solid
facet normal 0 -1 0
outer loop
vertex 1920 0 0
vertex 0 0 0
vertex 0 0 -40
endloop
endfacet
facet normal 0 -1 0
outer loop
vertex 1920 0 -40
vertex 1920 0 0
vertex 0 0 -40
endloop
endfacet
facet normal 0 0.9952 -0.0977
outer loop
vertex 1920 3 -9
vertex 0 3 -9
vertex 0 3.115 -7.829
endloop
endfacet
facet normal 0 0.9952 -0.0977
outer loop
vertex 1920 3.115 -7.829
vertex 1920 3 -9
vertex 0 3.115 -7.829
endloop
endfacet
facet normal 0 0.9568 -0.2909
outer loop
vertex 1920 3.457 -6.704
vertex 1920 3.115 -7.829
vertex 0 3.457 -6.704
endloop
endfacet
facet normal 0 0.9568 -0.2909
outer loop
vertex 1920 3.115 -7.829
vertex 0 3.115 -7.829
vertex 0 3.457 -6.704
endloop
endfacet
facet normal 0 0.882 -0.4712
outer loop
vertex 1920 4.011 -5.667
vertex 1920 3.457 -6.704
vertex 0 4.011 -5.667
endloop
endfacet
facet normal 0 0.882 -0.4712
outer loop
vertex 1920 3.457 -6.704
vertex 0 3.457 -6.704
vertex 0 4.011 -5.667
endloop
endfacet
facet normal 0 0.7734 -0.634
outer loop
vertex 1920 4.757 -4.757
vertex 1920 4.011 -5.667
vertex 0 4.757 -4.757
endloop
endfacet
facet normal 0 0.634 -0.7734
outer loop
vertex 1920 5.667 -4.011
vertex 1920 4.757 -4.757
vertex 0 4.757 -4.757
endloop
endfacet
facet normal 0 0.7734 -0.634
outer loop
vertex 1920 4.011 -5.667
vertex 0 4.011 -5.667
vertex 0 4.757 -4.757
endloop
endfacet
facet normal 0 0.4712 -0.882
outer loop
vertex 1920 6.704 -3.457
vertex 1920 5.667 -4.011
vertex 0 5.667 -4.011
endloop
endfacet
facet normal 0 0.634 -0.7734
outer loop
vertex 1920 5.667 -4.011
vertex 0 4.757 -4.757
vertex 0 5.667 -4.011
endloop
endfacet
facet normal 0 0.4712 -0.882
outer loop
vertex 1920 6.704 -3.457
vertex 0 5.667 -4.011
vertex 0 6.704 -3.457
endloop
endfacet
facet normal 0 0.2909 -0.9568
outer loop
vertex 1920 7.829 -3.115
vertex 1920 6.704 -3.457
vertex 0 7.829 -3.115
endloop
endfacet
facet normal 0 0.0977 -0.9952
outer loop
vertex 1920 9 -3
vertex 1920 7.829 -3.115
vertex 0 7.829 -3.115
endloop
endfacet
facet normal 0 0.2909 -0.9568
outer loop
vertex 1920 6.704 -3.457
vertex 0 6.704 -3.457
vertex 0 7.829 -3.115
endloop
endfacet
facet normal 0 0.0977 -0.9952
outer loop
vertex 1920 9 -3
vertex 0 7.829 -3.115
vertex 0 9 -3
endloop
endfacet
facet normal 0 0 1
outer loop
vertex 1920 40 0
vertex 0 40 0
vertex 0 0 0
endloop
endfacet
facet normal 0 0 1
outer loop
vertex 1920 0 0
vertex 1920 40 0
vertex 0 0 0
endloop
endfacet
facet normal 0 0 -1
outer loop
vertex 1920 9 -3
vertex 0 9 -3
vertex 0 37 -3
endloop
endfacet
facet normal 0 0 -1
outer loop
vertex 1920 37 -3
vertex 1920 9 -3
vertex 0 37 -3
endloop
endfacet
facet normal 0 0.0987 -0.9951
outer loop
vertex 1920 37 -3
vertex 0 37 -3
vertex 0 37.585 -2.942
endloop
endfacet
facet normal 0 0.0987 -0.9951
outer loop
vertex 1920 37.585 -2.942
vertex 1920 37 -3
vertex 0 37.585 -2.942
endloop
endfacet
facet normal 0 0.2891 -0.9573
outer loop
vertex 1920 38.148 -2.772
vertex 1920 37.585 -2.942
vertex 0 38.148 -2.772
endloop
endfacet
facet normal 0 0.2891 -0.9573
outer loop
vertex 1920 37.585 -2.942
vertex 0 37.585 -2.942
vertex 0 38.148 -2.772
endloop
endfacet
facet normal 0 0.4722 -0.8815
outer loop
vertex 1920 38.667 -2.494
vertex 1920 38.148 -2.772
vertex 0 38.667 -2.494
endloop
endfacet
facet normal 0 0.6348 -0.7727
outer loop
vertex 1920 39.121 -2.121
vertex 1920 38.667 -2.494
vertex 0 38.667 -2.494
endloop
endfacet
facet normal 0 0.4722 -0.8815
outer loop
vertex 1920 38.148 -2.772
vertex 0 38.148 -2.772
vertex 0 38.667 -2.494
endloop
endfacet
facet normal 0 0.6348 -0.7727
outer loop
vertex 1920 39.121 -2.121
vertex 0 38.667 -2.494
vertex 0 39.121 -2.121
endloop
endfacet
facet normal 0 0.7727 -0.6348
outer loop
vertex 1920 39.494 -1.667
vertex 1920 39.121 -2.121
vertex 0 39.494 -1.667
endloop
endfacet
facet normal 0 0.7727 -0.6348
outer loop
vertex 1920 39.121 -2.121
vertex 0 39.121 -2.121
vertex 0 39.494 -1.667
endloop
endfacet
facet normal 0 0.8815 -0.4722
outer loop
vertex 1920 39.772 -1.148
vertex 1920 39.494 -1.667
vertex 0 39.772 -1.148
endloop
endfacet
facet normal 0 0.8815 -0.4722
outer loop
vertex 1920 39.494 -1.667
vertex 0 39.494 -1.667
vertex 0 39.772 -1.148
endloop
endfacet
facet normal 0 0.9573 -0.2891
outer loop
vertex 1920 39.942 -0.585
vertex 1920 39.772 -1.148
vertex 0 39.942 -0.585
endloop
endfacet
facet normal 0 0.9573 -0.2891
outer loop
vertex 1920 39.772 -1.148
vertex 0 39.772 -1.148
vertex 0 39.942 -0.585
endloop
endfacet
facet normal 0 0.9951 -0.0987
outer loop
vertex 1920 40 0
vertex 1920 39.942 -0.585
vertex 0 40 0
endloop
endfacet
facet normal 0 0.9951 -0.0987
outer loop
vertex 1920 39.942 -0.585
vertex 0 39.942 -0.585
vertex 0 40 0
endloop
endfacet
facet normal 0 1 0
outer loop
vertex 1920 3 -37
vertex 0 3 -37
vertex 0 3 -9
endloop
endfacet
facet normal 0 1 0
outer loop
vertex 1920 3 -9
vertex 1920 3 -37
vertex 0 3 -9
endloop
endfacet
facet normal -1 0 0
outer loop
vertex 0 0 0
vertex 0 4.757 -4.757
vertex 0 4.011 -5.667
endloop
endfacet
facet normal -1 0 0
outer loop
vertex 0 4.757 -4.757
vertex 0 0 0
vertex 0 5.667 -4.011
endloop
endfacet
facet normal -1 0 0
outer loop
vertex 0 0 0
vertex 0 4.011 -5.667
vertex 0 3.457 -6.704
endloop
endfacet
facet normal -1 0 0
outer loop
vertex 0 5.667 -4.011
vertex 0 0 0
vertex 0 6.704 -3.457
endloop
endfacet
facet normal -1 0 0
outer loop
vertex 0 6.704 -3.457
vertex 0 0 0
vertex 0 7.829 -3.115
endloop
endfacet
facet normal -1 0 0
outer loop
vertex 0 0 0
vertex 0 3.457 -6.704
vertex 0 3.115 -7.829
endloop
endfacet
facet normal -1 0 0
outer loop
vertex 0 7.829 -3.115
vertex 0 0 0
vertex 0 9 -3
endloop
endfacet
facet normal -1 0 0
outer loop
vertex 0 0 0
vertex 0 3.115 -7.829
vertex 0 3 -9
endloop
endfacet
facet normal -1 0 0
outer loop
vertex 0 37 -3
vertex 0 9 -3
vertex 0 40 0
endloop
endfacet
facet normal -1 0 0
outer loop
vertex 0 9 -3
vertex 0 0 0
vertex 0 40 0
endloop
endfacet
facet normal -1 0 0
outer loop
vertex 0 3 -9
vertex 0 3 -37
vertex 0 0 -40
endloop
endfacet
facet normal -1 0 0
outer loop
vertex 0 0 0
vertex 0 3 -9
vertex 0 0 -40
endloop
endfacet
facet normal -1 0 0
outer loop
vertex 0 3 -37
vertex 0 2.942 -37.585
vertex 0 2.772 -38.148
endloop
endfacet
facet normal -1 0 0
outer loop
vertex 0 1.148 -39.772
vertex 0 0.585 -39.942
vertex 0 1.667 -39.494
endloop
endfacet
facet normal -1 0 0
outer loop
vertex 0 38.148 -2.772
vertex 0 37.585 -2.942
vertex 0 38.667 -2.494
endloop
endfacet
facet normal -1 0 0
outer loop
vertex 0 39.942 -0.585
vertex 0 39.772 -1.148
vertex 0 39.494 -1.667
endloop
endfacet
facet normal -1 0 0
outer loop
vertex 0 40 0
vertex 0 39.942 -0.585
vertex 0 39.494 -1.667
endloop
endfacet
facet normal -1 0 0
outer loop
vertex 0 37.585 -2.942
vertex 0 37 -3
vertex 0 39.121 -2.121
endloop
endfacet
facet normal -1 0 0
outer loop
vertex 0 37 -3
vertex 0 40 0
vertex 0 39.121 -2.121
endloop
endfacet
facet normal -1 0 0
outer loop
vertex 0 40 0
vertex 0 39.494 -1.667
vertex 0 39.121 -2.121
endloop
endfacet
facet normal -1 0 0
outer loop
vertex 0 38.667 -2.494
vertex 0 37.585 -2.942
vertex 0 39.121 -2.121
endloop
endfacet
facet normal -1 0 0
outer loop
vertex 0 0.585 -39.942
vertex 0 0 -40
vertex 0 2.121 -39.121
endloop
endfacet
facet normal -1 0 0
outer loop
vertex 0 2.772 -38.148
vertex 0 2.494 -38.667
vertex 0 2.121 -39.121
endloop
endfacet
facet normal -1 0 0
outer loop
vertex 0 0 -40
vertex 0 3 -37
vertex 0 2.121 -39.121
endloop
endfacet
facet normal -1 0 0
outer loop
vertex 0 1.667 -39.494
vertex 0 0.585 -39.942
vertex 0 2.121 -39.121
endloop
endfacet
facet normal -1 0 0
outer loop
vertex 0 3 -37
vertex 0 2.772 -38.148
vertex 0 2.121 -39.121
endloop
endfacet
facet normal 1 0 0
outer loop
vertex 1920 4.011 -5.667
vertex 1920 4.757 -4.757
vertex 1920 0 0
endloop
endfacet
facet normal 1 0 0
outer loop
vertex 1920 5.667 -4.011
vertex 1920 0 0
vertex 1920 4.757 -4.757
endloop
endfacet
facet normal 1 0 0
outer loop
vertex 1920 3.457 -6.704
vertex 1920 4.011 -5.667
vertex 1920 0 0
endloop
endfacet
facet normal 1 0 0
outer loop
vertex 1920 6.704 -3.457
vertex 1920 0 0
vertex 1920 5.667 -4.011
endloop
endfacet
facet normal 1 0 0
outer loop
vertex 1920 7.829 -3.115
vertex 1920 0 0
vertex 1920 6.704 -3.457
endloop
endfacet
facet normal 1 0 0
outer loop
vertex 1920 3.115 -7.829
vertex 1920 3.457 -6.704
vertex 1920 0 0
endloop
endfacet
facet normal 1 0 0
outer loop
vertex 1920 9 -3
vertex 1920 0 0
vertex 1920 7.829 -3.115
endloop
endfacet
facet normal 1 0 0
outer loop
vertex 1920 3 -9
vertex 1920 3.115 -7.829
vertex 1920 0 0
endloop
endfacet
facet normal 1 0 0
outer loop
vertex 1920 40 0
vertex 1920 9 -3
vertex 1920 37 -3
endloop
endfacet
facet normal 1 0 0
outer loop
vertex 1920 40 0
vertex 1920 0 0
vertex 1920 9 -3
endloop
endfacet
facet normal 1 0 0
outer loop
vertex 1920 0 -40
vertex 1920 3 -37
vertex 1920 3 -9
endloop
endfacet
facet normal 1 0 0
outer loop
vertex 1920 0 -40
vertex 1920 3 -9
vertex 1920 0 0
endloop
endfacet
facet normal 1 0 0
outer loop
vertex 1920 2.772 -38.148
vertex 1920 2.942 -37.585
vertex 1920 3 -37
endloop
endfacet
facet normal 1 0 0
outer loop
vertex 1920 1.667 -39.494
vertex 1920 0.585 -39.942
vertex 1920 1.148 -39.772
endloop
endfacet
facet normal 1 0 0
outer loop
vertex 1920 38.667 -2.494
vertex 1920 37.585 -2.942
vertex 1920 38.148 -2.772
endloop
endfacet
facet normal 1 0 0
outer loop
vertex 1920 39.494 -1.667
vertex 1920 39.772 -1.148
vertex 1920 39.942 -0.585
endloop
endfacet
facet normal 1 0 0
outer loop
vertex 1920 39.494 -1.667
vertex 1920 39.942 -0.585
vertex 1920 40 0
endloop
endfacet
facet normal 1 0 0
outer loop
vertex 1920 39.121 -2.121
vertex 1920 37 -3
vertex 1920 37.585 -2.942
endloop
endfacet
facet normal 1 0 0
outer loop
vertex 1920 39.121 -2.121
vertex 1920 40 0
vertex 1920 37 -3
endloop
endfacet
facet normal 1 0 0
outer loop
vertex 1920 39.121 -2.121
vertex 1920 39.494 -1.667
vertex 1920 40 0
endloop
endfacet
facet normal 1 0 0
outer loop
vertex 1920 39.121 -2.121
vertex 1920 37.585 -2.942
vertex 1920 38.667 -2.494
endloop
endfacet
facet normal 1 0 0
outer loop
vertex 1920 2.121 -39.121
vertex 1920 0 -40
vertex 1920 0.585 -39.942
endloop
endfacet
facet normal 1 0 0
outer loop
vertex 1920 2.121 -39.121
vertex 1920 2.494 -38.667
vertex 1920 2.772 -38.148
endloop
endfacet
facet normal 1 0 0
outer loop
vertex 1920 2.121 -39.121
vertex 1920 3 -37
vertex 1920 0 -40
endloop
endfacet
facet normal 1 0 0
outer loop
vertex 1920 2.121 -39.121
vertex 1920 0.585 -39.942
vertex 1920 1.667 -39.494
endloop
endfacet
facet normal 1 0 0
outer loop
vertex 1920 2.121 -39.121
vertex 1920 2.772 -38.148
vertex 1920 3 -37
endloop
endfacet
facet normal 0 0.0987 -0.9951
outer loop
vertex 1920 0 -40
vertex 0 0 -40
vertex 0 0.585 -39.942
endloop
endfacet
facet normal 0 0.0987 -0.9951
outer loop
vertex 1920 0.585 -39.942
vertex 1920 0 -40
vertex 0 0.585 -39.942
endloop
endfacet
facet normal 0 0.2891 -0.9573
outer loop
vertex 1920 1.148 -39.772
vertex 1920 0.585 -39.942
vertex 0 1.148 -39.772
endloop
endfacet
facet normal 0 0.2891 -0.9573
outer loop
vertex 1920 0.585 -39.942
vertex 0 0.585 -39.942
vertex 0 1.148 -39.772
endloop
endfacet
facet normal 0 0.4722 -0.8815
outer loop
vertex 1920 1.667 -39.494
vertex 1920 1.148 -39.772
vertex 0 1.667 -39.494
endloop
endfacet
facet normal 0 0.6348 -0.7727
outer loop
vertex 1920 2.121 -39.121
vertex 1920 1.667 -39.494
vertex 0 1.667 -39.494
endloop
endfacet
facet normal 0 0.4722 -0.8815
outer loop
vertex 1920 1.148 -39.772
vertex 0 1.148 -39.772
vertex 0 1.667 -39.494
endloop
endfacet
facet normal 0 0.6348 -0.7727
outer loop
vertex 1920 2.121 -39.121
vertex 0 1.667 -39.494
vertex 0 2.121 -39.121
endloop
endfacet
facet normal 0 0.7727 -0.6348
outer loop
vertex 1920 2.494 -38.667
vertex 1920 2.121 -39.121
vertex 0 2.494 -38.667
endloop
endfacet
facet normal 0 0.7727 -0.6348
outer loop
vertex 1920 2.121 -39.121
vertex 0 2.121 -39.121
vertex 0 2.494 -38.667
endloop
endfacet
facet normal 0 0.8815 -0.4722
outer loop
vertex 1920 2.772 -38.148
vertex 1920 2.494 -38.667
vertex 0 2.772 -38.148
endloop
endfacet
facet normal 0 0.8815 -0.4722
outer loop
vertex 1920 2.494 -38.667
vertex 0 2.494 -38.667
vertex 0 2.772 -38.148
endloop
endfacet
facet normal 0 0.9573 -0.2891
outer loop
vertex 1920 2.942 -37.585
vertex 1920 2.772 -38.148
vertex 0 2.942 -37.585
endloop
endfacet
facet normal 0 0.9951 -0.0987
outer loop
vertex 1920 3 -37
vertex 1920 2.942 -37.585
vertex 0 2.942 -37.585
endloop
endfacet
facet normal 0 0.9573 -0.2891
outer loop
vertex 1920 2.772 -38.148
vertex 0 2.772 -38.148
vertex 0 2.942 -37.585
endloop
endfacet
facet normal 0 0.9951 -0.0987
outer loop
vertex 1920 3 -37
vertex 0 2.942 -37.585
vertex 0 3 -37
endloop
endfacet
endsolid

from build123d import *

# Parameters (mm, degrees)
L_ANGLE_EQUAL_40X40X3_2_DEPTH = 1920


with BuildPart() as part:
    # Sketch13 → L angle (equal) 40X40X3(2) (new body)
    with BuildSketch(Plane(origin=(0, 0, 0), x_dir=(0, 0, -1), z_dir=(1, 0, 0))):
        with BuildLine():
            Line((0, 40), (0, 0))
            Line((0, 0), (40, 0))
            ThreePointArc((40, 0), (39.121320344, 2.121320344), (37, 3))
            Line((37, 3), (9, 3))
            ThreePointArc((9, 3), (4.757359313, 4.757359313), (3, 9))
            Line((3, 9), (3, 37))
            ThreePointArc((3, 37), (2.121320344, 39.121320344), (0, 40))
        make_face()
    extrude(amount=L_ANGLE_EQUAL_40X40X3_2_DEPTH)


solid = part.part
